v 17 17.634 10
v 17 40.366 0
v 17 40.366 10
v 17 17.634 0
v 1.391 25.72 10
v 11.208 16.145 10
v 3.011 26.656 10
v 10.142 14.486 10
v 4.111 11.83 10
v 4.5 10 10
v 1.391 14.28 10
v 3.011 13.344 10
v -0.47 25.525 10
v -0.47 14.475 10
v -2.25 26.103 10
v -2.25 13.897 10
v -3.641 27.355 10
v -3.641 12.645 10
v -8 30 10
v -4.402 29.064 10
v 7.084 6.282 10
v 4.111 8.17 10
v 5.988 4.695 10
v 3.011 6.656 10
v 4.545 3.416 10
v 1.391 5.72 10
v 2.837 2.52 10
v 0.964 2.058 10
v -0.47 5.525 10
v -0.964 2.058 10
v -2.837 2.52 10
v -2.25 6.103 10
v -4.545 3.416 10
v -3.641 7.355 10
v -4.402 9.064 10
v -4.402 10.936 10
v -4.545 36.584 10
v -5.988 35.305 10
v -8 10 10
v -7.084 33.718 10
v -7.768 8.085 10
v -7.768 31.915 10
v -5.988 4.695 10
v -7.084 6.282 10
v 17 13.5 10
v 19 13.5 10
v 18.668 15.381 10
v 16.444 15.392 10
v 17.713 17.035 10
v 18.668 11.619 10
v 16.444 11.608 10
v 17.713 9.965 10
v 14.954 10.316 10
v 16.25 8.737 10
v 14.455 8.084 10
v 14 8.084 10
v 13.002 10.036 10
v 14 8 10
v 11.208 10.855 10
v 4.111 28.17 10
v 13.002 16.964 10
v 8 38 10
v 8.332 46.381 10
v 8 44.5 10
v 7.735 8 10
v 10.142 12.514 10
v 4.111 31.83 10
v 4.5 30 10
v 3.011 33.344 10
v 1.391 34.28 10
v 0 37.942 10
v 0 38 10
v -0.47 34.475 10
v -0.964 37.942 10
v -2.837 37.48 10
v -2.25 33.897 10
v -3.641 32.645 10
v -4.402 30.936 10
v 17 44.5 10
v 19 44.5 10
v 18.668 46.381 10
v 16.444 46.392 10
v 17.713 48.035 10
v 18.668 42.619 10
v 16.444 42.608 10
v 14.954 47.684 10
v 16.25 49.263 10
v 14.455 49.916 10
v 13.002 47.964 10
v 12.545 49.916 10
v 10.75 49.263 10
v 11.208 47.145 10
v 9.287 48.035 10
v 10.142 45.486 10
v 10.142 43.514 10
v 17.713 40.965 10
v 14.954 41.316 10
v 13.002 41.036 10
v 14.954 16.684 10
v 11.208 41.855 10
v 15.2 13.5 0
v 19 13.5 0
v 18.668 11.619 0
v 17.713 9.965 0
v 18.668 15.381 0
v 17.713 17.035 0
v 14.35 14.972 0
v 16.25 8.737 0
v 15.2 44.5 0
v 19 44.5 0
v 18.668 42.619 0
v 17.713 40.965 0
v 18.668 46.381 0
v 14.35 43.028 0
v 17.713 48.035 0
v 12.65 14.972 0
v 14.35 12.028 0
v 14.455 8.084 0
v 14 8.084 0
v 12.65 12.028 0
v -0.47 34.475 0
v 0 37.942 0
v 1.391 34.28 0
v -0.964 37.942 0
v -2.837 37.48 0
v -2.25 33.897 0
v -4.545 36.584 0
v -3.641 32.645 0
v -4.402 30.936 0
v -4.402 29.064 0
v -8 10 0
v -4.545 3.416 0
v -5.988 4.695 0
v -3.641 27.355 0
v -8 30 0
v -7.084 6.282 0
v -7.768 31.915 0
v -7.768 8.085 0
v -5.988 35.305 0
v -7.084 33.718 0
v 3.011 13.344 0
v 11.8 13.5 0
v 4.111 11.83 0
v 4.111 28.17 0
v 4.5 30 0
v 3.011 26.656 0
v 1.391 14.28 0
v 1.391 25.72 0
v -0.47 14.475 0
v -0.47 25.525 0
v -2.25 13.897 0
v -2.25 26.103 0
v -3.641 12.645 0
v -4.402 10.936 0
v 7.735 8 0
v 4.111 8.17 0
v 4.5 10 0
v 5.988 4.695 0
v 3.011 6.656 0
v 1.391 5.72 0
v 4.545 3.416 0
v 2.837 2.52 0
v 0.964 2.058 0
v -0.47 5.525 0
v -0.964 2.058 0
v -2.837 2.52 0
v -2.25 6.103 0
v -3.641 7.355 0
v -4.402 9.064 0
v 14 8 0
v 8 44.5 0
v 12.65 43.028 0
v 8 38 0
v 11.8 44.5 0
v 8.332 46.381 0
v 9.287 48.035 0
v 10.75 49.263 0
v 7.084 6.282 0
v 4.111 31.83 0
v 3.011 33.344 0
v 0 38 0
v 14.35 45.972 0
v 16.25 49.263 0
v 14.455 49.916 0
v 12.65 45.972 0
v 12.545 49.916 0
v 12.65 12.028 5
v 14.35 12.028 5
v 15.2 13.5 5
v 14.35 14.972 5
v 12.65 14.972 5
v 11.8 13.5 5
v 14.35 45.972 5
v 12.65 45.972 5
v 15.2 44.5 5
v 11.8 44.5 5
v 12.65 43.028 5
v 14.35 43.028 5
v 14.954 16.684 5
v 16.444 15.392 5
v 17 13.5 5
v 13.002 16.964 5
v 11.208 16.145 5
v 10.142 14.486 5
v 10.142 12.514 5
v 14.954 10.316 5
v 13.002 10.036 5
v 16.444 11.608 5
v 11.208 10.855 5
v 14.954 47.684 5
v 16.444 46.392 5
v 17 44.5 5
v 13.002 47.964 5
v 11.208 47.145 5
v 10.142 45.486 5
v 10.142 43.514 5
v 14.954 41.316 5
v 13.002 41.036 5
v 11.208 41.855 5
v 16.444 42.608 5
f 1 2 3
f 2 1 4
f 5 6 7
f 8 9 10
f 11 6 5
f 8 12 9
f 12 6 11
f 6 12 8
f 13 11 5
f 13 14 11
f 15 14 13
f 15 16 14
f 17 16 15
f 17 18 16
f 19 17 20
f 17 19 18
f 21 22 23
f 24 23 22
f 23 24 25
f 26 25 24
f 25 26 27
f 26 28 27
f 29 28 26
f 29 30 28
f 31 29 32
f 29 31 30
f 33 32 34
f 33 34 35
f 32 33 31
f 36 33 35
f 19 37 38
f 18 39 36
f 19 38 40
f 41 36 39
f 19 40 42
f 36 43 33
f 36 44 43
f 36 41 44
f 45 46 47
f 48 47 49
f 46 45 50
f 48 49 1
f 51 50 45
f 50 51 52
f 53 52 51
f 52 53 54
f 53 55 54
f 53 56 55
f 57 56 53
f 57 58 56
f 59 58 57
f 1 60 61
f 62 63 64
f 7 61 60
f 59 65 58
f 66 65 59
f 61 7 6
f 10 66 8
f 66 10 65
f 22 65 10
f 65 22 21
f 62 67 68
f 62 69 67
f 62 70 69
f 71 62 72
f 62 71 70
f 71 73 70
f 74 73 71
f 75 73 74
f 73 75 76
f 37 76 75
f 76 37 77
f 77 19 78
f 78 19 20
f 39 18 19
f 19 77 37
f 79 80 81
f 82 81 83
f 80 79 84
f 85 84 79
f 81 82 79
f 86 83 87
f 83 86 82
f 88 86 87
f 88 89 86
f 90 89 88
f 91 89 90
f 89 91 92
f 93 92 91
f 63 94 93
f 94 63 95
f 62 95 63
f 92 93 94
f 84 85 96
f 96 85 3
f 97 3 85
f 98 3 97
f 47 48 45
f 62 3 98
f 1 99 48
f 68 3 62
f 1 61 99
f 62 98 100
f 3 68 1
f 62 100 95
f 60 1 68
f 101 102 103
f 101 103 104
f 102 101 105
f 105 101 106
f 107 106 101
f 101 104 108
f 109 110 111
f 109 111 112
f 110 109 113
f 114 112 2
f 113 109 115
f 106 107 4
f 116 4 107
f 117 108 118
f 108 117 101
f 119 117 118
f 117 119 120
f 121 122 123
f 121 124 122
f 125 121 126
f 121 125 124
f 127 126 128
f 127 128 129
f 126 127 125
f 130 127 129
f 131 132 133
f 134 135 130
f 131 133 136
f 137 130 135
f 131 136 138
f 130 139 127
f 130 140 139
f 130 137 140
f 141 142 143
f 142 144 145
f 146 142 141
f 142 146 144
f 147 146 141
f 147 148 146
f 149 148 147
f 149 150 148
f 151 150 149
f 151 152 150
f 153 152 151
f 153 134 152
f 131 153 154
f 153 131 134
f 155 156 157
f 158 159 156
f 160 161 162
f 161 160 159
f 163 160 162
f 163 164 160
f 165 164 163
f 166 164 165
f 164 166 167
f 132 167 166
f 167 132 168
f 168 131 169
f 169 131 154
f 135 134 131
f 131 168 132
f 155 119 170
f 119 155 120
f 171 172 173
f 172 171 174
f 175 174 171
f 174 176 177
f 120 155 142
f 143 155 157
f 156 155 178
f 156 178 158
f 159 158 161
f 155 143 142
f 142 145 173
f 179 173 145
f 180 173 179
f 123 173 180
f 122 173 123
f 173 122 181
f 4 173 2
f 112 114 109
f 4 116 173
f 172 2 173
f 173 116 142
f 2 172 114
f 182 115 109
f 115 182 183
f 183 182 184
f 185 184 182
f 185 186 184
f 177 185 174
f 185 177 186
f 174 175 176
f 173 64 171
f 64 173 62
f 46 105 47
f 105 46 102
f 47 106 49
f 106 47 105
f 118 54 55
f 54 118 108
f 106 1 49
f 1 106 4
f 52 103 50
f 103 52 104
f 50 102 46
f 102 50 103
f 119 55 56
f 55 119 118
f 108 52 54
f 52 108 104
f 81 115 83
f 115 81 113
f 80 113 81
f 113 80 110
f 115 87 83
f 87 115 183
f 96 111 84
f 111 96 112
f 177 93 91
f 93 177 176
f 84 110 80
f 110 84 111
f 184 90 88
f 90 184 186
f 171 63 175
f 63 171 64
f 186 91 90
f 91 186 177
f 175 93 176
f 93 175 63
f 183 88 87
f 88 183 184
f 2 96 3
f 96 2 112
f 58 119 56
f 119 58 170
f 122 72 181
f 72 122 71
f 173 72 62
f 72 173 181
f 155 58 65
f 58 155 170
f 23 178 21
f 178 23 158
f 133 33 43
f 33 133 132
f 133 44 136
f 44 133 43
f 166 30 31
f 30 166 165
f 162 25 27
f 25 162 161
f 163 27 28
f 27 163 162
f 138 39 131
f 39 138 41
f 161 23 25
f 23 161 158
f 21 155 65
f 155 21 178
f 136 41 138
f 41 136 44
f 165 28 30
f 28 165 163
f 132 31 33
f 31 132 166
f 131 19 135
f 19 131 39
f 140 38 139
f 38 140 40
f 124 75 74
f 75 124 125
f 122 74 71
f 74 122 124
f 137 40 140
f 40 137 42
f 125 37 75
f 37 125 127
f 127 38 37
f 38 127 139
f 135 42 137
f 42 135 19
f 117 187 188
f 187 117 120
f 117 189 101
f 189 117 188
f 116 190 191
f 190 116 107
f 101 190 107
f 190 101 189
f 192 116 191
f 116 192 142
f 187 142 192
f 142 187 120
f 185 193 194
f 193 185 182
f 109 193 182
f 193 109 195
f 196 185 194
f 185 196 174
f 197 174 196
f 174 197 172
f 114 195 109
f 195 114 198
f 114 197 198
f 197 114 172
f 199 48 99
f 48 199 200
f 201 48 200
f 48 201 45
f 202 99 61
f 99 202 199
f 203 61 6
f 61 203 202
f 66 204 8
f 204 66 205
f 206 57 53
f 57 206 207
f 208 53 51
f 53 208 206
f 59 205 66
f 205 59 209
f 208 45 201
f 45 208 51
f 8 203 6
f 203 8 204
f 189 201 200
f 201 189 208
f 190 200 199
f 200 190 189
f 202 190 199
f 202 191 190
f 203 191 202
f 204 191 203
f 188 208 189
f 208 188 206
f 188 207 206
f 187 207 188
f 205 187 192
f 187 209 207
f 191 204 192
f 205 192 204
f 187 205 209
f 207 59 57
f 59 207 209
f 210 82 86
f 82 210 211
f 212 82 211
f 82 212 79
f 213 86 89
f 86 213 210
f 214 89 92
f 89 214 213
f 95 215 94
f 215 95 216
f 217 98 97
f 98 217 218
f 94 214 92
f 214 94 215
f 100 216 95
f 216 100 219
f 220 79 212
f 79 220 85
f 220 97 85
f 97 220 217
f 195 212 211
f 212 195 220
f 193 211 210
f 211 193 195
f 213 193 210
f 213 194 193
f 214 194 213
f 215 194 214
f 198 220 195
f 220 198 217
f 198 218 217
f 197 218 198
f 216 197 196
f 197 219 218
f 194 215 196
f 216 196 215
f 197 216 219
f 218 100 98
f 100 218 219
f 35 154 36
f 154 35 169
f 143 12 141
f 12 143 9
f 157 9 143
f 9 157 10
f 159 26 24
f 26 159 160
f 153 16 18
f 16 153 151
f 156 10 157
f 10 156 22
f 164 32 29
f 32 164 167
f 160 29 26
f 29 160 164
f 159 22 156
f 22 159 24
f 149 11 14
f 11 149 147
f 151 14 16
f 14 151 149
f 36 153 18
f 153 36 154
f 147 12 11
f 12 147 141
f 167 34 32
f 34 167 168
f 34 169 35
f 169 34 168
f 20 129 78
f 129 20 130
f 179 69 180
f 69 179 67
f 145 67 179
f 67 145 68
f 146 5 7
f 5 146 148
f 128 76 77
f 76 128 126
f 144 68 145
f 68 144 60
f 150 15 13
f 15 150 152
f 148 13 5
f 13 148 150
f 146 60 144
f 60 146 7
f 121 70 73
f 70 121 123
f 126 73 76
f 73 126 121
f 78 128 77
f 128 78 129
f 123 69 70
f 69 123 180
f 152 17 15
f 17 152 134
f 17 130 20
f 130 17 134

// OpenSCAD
// PRUSA iteration3
// Y motor mount
// GNU GPL v3
// Josef Průša <iam@josefprusa.cz> and contributors
// http://www.reprap.org/wiki/Prusa_Mendel
// http://prusamendel.org

//include <../../configuration.scad>

module y_motor_base(){
 // Motor holding part
 translate(v = [29,-21+50,0]){
  translate(v = [-21+4.5,0,5]) cube(size = [9,31,10], center=true);
  translate(v = [-15.5,-15.5,0]) cylinder(h = 10, r=5.5);
  translate(v = [-15.5,+15.5,0]) cylinder(h = 10, r=5.5);
  // Joins motor holder and rod plate
  translate(v = [-29,-21,0]) cube(size = [14,30,10]);
 }
 // Front holding part
 translate(v = [0,10,0]) cylinder(h = 10, r=8);
 translate(v = [0,20,5])cube(size = [16,20,10], center=true);	
 translate(v = [0,30,0])cylinder(h = 10, r=8);
}

module y_motor_holes(){
 translate(v = [29,-21+50,0]){
  // Screw head holes
  translate(v = [-15.5,-15.5,-1]) cylinder(h = 10, r=1.7);
  translate(v = [-15.5,+15.5,-1]) cylinder(h = 10, r=1.7);
  // Screw holes
  translate(v = [-15.5,-15.5,5]) cylinder(h = 7, r=3.5);
  translate(v = [-15.5,+15.5,5]) cylinder(h = 7, r=3.5);
 }
 translate(v = [0,10,-1]) cylinder(h = 12, r=4.5);	
 translate(v = [0,30,-1])cylinder(h = 12, r=4.5);
}

// Final part
module y_motor(){
 difference(){
  y_motor_base();
  y_motor_holes();
 }
}

y_motor();
